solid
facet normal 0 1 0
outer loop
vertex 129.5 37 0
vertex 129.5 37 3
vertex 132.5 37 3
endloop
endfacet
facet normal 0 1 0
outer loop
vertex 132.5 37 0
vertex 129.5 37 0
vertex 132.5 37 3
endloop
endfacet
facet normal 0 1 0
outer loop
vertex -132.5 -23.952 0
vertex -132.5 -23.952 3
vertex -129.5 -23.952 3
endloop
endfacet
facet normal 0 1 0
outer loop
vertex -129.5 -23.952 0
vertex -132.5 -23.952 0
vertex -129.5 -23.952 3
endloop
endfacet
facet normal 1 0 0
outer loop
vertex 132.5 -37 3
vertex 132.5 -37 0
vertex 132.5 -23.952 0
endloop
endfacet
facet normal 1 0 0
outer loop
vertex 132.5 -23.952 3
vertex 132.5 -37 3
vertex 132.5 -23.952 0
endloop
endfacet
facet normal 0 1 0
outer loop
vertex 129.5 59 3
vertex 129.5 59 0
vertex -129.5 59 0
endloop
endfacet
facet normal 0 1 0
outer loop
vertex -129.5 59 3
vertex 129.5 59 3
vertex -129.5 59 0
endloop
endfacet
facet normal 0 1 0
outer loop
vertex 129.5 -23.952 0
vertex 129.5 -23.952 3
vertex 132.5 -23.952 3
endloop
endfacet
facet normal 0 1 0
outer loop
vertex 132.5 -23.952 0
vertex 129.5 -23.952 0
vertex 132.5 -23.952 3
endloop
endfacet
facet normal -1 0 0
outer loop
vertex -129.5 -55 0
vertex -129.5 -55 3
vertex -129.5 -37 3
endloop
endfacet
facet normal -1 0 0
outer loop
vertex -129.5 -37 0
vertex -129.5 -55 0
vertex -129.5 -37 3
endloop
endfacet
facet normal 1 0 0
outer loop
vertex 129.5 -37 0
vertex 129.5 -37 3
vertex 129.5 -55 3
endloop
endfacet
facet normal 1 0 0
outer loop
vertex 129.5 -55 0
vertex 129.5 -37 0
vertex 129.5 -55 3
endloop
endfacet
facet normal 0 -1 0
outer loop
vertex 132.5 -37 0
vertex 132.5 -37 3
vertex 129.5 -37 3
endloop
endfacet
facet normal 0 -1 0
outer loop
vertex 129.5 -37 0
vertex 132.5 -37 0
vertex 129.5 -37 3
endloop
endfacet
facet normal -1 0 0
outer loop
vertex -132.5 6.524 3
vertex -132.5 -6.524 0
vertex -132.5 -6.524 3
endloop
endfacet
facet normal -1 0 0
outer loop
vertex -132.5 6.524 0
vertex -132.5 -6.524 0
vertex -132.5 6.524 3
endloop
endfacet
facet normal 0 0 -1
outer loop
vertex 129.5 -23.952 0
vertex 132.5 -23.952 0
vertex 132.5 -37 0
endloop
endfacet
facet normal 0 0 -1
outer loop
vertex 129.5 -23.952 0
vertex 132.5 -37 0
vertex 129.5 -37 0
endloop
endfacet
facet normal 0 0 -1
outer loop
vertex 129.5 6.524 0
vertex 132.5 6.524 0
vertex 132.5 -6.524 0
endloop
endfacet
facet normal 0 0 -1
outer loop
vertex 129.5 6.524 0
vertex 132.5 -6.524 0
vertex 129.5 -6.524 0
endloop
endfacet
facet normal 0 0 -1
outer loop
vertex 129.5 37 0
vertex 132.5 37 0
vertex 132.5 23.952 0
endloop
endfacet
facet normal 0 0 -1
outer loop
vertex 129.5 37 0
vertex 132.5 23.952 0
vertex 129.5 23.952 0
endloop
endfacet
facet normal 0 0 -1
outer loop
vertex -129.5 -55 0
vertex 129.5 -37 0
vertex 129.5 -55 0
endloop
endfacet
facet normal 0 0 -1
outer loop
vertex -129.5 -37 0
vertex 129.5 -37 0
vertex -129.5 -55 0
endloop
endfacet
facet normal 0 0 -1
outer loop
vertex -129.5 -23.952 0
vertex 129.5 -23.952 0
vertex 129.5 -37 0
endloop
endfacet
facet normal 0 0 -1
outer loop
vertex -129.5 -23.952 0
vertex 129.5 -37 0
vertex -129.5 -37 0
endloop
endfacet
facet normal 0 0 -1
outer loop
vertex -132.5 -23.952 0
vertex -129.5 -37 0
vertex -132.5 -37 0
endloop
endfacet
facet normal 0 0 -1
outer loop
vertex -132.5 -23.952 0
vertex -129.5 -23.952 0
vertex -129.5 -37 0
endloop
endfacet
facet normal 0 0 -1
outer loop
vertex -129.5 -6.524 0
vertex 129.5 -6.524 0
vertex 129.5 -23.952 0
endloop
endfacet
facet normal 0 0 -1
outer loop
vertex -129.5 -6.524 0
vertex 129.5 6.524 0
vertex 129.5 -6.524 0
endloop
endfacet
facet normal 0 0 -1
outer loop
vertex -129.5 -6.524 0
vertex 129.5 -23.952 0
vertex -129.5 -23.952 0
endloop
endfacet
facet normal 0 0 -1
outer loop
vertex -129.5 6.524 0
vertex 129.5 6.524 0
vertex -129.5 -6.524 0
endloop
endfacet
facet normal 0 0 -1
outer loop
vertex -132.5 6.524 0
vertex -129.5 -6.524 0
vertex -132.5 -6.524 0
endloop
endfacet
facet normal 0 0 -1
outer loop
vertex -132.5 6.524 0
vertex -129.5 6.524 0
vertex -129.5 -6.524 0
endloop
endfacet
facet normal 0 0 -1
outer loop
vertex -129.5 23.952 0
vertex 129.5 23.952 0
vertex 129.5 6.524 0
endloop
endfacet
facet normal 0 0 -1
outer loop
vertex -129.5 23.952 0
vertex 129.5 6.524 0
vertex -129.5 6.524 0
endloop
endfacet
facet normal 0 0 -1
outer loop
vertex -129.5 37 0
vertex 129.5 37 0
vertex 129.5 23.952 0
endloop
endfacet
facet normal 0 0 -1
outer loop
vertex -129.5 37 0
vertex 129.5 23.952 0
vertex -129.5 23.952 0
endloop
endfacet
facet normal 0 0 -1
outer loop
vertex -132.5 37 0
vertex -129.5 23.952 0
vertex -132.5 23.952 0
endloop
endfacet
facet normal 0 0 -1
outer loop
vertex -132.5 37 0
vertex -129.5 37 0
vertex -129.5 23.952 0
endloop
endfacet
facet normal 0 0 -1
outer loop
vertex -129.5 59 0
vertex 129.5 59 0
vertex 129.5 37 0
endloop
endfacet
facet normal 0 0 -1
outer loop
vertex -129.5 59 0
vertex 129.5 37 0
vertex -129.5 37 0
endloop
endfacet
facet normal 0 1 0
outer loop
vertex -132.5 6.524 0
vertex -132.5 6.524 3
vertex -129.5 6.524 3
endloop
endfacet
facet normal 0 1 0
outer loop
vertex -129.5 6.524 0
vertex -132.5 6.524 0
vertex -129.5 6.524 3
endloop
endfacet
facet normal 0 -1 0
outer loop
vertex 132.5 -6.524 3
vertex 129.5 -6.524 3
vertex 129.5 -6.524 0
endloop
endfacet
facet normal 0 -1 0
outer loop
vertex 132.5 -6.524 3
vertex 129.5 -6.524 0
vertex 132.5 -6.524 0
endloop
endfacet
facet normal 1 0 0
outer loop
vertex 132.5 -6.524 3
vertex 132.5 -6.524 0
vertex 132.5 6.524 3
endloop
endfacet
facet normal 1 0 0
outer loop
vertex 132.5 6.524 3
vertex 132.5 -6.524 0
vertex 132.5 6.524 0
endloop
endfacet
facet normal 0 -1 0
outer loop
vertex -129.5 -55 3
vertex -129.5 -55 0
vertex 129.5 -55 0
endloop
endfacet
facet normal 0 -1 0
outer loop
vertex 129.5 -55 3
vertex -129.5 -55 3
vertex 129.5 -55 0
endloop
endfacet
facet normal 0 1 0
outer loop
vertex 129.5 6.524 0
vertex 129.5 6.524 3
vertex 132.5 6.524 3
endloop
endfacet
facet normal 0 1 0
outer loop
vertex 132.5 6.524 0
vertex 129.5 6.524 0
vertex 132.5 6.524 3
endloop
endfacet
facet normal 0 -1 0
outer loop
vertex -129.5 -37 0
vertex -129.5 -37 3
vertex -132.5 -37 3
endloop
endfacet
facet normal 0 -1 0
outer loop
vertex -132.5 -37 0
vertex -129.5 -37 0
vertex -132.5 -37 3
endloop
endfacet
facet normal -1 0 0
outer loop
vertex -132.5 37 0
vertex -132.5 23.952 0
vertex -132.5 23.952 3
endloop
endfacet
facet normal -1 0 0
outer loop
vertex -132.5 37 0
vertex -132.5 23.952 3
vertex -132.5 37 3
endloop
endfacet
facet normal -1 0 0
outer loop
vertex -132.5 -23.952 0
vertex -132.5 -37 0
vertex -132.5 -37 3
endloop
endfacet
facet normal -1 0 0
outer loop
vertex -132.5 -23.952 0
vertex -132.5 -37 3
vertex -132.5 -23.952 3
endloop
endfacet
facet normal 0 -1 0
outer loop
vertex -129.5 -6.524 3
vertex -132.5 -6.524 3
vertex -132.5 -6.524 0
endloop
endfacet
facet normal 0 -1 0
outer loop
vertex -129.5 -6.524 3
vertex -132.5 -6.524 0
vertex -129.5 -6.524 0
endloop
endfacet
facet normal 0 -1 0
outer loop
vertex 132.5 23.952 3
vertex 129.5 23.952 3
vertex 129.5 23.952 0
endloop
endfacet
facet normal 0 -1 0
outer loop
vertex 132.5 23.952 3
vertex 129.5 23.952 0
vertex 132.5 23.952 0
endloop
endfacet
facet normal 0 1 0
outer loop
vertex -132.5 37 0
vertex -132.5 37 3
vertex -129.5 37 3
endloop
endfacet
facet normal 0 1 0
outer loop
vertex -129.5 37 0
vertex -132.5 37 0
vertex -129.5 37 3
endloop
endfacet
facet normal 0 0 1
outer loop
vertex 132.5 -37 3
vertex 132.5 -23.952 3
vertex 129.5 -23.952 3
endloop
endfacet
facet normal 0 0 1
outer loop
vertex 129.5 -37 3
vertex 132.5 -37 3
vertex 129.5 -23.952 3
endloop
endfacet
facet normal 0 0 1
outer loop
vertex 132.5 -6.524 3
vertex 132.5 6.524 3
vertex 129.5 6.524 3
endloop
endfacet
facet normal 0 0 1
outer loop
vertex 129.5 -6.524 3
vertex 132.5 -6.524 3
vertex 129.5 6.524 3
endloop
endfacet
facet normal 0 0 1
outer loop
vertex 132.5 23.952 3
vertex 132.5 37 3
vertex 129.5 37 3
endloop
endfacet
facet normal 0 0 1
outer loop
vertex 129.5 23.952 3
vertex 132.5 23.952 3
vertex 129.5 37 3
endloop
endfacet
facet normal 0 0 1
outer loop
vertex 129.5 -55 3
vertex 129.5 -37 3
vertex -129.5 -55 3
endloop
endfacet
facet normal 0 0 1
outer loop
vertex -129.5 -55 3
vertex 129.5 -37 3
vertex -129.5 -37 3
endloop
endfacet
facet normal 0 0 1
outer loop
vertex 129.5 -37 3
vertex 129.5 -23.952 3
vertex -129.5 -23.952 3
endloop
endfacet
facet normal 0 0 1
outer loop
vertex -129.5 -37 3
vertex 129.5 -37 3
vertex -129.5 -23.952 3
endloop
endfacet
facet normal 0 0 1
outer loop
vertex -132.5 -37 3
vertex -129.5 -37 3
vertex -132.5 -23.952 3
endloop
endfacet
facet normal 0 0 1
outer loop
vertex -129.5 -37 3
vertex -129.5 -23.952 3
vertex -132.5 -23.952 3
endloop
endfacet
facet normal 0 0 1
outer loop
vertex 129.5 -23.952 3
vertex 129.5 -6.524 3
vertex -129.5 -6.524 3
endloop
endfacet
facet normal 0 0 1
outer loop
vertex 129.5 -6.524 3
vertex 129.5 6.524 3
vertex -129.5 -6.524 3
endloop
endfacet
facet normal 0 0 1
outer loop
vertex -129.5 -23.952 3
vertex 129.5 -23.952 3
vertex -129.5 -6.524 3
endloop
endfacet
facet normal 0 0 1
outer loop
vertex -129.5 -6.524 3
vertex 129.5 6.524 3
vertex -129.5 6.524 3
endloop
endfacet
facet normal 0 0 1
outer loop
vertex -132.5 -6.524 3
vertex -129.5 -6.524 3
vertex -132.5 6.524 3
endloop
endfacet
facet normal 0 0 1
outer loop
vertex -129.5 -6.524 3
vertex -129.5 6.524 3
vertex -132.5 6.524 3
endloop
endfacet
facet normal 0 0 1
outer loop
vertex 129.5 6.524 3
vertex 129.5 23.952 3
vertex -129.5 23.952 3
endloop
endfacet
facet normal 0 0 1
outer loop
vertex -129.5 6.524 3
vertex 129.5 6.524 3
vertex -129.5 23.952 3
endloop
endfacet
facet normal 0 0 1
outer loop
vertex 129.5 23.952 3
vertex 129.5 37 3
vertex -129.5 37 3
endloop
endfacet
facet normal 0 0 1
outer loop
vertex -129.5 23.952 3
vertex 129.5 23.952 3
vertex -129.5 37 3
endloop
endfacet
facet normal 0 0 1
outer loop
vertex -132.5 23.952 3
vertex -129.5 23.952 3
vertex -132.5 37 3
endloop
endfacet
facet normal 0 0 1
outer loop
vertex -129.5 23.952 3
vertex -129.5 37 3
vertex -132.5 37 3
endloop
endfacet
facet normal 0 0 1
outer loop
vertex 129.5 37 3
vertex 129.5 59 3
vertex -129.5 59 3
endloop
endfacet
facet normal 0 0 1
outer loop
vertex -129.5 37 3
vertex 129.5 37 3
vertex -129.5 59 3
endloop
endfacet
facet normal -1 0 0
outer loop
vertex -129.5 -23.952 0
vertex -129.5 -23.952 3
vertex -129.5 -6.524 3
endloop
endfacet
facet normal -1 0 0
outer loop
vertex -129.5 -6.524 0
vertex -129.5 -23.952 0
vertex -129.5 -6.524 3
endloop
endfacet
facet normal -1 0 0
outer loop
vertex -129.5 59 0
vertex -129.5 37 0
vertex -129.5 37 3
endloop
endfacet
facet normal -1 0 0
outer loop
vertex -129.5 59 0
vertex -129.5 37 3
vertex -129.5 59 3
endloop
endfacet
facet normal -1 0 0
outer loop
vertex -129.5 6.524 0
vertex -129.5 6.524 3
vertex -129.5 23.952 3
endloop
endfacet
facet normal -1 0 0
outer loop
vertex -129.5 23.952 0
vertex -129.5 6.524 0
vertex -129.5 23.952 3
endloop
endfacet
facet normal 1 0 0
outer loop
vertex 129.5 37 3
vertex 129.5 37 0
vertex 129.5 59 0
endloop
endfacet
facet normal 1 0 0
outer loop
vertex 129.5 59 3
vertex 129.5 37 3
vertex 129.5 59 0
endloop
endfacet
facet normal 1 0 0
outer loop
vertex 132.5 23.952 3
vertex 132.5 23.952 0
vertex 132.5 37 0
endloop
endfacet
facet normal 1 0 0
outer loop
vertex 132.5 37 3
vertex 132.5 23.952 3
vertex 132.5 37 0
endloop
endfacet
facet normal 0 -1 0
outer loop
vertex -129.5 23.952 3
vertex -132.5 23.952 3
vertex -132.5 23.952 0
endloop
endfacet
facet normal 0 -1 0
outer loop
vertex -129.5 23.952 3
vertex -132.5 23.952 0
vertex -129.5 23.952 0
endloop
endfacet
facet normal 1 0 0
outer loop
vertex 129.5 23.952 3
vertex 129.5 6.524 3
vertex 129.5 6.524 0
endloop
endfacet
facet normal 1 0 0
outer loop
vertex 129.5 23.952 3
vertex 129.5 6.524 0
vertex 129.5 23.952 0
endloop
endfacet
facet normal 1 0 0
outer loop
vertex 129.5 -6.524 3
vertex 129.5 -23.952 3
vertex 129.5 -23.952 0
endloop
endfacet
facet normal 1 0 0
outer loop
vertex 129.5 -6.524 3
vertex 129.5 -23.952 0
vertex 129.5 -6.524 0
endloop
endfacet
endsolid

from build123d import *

# Parameters (mm, degrees)
CROQUIS1_W              = 265
CROQUIS1_H              = 110
SALIENTE_EXTRUIR1_DEPTH = 3
CROQUIS2_W              = 3
CROQUIS2_H              = 17.427708433
CORTAR_EXTRUIR1_DEPTH   = 3
CROQUIS4_W              = 259
CROQUIS4_H              = 4
SALIENTE_EXTRUIR3_DEPTH = 3


with BuildPart() as part:
    # Croquis1 → Saliente-Extruir1 (new body)
    with BuildSketch(Plane.XY):
        Rectangle(CROQUIS1_W, CROQUIS1_H)
    extrude(amount=SALIENTE_EXTRUIR1_DEPTH)

    # Croquis2 → Cortar-Extruir1 (cut)
    with BuildSketch(Plane.XY.offset(3)):
        Polygon((-132.5, 55), (-132.5, 37), (-129.5, 37), (-129.5, 52), (-129.5, 55), align=None)
        with Locations((-131, 15.237951406)):
            Rectangle(CROQUIS2_W, CROQUIS2_H)
        Polygon((129.5, 55), (129.5, 52), (129.5, 37), (132.5, 37), (132.5, 55), align=None)
        with Locations((131, 15.237951406)):
            Rectangle(CROQUIS2_W, CROQUIS2_H)
        with Locations((131, -15.237951406)):
            Rectangle(CROQUIS2_W, CROQUIS2_H)
        Polygon((129.5, -37), (129.5, -52), (129.5, -55), (132.5, -55), (132.5, -37), align=None)
        with Locations((-131, -15.237951406)):
            Rectangle(CROQUIS2_W, CROQUIS2_H)
        Polygon((-129.5, -37), (-132.5, -37), (-132.5, -55), (-129.5, -55), (-129.5, -52), align=None)
    extrude(amount=-CORTAR_EXTRUIR1_DEPTH, mode=Mode.SUBTRACT)

    # Croquis4 → Saliente-Extruir3 (add)
    with BuildSketch(Plane(origin=(0, 0, 0), x_dir=(-1, 0, 0), z_dir=(0, 0, -1))):
        with Locations((0, 57)):
            Rectangle(CROQUIS4_W, CROQUIS4_H)
    extrude(amount=-SALIENTE_EXTRUIR3_DEPTH)


solid = part.part
